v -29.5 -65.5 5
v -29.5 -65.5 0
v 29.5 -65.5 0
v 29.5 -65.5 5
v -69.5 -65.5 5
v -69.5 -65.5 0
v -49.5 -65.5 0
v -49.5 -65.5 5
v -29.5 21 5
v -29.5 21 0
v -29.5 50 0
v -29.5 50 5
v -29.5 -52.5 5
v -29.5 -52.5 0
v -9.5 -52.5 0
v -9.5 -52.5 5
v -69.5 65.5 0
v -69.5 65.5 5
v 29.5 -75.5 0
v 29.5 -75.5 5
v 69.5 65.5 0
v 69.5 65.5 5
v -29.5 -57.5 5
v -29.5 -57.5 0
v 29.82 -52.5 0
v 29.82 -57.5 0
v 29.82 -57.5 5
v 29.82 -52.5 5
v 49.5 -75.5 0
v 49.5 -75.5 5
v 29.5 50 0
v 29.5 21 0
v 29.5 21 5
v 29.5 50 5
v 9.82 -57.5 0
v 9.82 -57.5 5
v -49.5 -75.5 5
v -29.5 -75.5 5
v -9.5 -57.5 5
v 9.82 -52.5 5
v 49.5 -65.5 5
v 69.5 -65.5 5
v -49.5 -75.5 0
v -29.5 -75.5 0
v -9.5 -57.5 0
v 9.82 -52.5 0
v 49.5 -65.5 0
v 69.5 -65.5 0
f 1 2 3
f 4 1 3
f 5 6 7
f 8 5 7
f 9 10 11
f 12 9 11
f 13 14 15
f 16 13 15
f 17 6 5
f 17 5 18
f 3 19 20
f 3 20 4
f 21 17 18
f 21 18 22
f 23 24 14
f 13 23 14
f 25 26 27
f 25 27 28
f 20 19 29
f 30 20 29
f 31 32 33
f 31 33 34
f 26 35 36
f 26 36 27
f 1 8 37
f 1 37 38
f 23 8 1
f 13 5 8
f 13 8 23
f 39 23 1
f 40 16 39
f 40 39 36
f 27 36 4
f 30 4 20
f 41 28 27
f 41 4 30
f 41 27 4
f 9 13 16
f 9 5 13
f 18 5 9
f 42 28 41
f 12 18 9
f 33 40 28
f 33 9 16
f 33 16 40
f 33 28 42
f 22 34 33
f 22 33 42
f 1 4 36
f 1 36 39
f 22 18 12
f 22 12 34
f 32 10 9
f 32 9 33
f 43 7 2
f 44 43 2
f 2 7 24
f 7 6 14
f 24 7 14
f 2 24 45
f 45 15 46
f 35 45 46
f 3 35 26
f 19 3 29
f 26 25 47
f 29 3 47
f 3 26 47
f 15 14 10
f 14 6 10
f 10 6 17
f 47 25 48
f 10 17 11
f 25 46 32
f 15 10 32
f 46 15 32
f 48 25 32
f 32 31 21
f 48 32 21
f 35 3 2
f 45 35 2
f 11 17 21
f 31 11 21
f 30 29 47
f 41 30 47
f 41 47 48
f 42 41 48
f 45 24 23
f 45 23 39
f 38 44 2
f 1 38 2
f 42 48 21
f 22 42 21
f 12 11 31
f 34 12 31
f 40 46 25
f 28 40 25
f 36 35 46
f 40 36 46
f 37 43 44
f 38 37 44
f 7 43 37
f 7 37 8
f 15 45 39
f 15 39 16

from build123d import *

# Parameters (mm, degrees)
SKETCH1_W           = 139
SKETCH1_H           = 131
SKETCH1_W_2         = 20
SKETCH1_H_2         = 5
SKETCH1_W_3         = 59
SKETCH1_H_3         = 29
SKETCH1_H_4         = 10
BOSS_EXTRUDE2_DEPTH = 5


with BuildPart() as part:
    # Sketch1 → Boss-Extrude2 (new body)
    with BuildSketch(Plane.XY):
        Rectangle(SKETCH1_W, SKETCH1_H)
        with Locations((-19.5, -55)):
            Rectangle(SKETCH1_W_2, SKETCH1_H_2, mode=Mode.SUBTRACT)
        with Locations((19.819504059, -55)):
            Rectangle(SKETCH1_W_2, SKETCH1_H_2, mode=Mode.SUBTRACT)
        with Locations((0, 35.5)):
            Rectangle(SKETCH1_W_3, SKETCH1_H_3, mode=Mode.SUBTRACT)
        with Locations((-39.5, -70.5)):
            Rectangle(SKETCH1_W_2, SKETCH1_H_4)
        with Locations((39.5, -70.5)):
            Rectangle(SKETCH1_W_2, SKETCH1_H_4)
    extrude(amount=BOSS_EXTRUDE2_DEPTH)


solid = part.part
